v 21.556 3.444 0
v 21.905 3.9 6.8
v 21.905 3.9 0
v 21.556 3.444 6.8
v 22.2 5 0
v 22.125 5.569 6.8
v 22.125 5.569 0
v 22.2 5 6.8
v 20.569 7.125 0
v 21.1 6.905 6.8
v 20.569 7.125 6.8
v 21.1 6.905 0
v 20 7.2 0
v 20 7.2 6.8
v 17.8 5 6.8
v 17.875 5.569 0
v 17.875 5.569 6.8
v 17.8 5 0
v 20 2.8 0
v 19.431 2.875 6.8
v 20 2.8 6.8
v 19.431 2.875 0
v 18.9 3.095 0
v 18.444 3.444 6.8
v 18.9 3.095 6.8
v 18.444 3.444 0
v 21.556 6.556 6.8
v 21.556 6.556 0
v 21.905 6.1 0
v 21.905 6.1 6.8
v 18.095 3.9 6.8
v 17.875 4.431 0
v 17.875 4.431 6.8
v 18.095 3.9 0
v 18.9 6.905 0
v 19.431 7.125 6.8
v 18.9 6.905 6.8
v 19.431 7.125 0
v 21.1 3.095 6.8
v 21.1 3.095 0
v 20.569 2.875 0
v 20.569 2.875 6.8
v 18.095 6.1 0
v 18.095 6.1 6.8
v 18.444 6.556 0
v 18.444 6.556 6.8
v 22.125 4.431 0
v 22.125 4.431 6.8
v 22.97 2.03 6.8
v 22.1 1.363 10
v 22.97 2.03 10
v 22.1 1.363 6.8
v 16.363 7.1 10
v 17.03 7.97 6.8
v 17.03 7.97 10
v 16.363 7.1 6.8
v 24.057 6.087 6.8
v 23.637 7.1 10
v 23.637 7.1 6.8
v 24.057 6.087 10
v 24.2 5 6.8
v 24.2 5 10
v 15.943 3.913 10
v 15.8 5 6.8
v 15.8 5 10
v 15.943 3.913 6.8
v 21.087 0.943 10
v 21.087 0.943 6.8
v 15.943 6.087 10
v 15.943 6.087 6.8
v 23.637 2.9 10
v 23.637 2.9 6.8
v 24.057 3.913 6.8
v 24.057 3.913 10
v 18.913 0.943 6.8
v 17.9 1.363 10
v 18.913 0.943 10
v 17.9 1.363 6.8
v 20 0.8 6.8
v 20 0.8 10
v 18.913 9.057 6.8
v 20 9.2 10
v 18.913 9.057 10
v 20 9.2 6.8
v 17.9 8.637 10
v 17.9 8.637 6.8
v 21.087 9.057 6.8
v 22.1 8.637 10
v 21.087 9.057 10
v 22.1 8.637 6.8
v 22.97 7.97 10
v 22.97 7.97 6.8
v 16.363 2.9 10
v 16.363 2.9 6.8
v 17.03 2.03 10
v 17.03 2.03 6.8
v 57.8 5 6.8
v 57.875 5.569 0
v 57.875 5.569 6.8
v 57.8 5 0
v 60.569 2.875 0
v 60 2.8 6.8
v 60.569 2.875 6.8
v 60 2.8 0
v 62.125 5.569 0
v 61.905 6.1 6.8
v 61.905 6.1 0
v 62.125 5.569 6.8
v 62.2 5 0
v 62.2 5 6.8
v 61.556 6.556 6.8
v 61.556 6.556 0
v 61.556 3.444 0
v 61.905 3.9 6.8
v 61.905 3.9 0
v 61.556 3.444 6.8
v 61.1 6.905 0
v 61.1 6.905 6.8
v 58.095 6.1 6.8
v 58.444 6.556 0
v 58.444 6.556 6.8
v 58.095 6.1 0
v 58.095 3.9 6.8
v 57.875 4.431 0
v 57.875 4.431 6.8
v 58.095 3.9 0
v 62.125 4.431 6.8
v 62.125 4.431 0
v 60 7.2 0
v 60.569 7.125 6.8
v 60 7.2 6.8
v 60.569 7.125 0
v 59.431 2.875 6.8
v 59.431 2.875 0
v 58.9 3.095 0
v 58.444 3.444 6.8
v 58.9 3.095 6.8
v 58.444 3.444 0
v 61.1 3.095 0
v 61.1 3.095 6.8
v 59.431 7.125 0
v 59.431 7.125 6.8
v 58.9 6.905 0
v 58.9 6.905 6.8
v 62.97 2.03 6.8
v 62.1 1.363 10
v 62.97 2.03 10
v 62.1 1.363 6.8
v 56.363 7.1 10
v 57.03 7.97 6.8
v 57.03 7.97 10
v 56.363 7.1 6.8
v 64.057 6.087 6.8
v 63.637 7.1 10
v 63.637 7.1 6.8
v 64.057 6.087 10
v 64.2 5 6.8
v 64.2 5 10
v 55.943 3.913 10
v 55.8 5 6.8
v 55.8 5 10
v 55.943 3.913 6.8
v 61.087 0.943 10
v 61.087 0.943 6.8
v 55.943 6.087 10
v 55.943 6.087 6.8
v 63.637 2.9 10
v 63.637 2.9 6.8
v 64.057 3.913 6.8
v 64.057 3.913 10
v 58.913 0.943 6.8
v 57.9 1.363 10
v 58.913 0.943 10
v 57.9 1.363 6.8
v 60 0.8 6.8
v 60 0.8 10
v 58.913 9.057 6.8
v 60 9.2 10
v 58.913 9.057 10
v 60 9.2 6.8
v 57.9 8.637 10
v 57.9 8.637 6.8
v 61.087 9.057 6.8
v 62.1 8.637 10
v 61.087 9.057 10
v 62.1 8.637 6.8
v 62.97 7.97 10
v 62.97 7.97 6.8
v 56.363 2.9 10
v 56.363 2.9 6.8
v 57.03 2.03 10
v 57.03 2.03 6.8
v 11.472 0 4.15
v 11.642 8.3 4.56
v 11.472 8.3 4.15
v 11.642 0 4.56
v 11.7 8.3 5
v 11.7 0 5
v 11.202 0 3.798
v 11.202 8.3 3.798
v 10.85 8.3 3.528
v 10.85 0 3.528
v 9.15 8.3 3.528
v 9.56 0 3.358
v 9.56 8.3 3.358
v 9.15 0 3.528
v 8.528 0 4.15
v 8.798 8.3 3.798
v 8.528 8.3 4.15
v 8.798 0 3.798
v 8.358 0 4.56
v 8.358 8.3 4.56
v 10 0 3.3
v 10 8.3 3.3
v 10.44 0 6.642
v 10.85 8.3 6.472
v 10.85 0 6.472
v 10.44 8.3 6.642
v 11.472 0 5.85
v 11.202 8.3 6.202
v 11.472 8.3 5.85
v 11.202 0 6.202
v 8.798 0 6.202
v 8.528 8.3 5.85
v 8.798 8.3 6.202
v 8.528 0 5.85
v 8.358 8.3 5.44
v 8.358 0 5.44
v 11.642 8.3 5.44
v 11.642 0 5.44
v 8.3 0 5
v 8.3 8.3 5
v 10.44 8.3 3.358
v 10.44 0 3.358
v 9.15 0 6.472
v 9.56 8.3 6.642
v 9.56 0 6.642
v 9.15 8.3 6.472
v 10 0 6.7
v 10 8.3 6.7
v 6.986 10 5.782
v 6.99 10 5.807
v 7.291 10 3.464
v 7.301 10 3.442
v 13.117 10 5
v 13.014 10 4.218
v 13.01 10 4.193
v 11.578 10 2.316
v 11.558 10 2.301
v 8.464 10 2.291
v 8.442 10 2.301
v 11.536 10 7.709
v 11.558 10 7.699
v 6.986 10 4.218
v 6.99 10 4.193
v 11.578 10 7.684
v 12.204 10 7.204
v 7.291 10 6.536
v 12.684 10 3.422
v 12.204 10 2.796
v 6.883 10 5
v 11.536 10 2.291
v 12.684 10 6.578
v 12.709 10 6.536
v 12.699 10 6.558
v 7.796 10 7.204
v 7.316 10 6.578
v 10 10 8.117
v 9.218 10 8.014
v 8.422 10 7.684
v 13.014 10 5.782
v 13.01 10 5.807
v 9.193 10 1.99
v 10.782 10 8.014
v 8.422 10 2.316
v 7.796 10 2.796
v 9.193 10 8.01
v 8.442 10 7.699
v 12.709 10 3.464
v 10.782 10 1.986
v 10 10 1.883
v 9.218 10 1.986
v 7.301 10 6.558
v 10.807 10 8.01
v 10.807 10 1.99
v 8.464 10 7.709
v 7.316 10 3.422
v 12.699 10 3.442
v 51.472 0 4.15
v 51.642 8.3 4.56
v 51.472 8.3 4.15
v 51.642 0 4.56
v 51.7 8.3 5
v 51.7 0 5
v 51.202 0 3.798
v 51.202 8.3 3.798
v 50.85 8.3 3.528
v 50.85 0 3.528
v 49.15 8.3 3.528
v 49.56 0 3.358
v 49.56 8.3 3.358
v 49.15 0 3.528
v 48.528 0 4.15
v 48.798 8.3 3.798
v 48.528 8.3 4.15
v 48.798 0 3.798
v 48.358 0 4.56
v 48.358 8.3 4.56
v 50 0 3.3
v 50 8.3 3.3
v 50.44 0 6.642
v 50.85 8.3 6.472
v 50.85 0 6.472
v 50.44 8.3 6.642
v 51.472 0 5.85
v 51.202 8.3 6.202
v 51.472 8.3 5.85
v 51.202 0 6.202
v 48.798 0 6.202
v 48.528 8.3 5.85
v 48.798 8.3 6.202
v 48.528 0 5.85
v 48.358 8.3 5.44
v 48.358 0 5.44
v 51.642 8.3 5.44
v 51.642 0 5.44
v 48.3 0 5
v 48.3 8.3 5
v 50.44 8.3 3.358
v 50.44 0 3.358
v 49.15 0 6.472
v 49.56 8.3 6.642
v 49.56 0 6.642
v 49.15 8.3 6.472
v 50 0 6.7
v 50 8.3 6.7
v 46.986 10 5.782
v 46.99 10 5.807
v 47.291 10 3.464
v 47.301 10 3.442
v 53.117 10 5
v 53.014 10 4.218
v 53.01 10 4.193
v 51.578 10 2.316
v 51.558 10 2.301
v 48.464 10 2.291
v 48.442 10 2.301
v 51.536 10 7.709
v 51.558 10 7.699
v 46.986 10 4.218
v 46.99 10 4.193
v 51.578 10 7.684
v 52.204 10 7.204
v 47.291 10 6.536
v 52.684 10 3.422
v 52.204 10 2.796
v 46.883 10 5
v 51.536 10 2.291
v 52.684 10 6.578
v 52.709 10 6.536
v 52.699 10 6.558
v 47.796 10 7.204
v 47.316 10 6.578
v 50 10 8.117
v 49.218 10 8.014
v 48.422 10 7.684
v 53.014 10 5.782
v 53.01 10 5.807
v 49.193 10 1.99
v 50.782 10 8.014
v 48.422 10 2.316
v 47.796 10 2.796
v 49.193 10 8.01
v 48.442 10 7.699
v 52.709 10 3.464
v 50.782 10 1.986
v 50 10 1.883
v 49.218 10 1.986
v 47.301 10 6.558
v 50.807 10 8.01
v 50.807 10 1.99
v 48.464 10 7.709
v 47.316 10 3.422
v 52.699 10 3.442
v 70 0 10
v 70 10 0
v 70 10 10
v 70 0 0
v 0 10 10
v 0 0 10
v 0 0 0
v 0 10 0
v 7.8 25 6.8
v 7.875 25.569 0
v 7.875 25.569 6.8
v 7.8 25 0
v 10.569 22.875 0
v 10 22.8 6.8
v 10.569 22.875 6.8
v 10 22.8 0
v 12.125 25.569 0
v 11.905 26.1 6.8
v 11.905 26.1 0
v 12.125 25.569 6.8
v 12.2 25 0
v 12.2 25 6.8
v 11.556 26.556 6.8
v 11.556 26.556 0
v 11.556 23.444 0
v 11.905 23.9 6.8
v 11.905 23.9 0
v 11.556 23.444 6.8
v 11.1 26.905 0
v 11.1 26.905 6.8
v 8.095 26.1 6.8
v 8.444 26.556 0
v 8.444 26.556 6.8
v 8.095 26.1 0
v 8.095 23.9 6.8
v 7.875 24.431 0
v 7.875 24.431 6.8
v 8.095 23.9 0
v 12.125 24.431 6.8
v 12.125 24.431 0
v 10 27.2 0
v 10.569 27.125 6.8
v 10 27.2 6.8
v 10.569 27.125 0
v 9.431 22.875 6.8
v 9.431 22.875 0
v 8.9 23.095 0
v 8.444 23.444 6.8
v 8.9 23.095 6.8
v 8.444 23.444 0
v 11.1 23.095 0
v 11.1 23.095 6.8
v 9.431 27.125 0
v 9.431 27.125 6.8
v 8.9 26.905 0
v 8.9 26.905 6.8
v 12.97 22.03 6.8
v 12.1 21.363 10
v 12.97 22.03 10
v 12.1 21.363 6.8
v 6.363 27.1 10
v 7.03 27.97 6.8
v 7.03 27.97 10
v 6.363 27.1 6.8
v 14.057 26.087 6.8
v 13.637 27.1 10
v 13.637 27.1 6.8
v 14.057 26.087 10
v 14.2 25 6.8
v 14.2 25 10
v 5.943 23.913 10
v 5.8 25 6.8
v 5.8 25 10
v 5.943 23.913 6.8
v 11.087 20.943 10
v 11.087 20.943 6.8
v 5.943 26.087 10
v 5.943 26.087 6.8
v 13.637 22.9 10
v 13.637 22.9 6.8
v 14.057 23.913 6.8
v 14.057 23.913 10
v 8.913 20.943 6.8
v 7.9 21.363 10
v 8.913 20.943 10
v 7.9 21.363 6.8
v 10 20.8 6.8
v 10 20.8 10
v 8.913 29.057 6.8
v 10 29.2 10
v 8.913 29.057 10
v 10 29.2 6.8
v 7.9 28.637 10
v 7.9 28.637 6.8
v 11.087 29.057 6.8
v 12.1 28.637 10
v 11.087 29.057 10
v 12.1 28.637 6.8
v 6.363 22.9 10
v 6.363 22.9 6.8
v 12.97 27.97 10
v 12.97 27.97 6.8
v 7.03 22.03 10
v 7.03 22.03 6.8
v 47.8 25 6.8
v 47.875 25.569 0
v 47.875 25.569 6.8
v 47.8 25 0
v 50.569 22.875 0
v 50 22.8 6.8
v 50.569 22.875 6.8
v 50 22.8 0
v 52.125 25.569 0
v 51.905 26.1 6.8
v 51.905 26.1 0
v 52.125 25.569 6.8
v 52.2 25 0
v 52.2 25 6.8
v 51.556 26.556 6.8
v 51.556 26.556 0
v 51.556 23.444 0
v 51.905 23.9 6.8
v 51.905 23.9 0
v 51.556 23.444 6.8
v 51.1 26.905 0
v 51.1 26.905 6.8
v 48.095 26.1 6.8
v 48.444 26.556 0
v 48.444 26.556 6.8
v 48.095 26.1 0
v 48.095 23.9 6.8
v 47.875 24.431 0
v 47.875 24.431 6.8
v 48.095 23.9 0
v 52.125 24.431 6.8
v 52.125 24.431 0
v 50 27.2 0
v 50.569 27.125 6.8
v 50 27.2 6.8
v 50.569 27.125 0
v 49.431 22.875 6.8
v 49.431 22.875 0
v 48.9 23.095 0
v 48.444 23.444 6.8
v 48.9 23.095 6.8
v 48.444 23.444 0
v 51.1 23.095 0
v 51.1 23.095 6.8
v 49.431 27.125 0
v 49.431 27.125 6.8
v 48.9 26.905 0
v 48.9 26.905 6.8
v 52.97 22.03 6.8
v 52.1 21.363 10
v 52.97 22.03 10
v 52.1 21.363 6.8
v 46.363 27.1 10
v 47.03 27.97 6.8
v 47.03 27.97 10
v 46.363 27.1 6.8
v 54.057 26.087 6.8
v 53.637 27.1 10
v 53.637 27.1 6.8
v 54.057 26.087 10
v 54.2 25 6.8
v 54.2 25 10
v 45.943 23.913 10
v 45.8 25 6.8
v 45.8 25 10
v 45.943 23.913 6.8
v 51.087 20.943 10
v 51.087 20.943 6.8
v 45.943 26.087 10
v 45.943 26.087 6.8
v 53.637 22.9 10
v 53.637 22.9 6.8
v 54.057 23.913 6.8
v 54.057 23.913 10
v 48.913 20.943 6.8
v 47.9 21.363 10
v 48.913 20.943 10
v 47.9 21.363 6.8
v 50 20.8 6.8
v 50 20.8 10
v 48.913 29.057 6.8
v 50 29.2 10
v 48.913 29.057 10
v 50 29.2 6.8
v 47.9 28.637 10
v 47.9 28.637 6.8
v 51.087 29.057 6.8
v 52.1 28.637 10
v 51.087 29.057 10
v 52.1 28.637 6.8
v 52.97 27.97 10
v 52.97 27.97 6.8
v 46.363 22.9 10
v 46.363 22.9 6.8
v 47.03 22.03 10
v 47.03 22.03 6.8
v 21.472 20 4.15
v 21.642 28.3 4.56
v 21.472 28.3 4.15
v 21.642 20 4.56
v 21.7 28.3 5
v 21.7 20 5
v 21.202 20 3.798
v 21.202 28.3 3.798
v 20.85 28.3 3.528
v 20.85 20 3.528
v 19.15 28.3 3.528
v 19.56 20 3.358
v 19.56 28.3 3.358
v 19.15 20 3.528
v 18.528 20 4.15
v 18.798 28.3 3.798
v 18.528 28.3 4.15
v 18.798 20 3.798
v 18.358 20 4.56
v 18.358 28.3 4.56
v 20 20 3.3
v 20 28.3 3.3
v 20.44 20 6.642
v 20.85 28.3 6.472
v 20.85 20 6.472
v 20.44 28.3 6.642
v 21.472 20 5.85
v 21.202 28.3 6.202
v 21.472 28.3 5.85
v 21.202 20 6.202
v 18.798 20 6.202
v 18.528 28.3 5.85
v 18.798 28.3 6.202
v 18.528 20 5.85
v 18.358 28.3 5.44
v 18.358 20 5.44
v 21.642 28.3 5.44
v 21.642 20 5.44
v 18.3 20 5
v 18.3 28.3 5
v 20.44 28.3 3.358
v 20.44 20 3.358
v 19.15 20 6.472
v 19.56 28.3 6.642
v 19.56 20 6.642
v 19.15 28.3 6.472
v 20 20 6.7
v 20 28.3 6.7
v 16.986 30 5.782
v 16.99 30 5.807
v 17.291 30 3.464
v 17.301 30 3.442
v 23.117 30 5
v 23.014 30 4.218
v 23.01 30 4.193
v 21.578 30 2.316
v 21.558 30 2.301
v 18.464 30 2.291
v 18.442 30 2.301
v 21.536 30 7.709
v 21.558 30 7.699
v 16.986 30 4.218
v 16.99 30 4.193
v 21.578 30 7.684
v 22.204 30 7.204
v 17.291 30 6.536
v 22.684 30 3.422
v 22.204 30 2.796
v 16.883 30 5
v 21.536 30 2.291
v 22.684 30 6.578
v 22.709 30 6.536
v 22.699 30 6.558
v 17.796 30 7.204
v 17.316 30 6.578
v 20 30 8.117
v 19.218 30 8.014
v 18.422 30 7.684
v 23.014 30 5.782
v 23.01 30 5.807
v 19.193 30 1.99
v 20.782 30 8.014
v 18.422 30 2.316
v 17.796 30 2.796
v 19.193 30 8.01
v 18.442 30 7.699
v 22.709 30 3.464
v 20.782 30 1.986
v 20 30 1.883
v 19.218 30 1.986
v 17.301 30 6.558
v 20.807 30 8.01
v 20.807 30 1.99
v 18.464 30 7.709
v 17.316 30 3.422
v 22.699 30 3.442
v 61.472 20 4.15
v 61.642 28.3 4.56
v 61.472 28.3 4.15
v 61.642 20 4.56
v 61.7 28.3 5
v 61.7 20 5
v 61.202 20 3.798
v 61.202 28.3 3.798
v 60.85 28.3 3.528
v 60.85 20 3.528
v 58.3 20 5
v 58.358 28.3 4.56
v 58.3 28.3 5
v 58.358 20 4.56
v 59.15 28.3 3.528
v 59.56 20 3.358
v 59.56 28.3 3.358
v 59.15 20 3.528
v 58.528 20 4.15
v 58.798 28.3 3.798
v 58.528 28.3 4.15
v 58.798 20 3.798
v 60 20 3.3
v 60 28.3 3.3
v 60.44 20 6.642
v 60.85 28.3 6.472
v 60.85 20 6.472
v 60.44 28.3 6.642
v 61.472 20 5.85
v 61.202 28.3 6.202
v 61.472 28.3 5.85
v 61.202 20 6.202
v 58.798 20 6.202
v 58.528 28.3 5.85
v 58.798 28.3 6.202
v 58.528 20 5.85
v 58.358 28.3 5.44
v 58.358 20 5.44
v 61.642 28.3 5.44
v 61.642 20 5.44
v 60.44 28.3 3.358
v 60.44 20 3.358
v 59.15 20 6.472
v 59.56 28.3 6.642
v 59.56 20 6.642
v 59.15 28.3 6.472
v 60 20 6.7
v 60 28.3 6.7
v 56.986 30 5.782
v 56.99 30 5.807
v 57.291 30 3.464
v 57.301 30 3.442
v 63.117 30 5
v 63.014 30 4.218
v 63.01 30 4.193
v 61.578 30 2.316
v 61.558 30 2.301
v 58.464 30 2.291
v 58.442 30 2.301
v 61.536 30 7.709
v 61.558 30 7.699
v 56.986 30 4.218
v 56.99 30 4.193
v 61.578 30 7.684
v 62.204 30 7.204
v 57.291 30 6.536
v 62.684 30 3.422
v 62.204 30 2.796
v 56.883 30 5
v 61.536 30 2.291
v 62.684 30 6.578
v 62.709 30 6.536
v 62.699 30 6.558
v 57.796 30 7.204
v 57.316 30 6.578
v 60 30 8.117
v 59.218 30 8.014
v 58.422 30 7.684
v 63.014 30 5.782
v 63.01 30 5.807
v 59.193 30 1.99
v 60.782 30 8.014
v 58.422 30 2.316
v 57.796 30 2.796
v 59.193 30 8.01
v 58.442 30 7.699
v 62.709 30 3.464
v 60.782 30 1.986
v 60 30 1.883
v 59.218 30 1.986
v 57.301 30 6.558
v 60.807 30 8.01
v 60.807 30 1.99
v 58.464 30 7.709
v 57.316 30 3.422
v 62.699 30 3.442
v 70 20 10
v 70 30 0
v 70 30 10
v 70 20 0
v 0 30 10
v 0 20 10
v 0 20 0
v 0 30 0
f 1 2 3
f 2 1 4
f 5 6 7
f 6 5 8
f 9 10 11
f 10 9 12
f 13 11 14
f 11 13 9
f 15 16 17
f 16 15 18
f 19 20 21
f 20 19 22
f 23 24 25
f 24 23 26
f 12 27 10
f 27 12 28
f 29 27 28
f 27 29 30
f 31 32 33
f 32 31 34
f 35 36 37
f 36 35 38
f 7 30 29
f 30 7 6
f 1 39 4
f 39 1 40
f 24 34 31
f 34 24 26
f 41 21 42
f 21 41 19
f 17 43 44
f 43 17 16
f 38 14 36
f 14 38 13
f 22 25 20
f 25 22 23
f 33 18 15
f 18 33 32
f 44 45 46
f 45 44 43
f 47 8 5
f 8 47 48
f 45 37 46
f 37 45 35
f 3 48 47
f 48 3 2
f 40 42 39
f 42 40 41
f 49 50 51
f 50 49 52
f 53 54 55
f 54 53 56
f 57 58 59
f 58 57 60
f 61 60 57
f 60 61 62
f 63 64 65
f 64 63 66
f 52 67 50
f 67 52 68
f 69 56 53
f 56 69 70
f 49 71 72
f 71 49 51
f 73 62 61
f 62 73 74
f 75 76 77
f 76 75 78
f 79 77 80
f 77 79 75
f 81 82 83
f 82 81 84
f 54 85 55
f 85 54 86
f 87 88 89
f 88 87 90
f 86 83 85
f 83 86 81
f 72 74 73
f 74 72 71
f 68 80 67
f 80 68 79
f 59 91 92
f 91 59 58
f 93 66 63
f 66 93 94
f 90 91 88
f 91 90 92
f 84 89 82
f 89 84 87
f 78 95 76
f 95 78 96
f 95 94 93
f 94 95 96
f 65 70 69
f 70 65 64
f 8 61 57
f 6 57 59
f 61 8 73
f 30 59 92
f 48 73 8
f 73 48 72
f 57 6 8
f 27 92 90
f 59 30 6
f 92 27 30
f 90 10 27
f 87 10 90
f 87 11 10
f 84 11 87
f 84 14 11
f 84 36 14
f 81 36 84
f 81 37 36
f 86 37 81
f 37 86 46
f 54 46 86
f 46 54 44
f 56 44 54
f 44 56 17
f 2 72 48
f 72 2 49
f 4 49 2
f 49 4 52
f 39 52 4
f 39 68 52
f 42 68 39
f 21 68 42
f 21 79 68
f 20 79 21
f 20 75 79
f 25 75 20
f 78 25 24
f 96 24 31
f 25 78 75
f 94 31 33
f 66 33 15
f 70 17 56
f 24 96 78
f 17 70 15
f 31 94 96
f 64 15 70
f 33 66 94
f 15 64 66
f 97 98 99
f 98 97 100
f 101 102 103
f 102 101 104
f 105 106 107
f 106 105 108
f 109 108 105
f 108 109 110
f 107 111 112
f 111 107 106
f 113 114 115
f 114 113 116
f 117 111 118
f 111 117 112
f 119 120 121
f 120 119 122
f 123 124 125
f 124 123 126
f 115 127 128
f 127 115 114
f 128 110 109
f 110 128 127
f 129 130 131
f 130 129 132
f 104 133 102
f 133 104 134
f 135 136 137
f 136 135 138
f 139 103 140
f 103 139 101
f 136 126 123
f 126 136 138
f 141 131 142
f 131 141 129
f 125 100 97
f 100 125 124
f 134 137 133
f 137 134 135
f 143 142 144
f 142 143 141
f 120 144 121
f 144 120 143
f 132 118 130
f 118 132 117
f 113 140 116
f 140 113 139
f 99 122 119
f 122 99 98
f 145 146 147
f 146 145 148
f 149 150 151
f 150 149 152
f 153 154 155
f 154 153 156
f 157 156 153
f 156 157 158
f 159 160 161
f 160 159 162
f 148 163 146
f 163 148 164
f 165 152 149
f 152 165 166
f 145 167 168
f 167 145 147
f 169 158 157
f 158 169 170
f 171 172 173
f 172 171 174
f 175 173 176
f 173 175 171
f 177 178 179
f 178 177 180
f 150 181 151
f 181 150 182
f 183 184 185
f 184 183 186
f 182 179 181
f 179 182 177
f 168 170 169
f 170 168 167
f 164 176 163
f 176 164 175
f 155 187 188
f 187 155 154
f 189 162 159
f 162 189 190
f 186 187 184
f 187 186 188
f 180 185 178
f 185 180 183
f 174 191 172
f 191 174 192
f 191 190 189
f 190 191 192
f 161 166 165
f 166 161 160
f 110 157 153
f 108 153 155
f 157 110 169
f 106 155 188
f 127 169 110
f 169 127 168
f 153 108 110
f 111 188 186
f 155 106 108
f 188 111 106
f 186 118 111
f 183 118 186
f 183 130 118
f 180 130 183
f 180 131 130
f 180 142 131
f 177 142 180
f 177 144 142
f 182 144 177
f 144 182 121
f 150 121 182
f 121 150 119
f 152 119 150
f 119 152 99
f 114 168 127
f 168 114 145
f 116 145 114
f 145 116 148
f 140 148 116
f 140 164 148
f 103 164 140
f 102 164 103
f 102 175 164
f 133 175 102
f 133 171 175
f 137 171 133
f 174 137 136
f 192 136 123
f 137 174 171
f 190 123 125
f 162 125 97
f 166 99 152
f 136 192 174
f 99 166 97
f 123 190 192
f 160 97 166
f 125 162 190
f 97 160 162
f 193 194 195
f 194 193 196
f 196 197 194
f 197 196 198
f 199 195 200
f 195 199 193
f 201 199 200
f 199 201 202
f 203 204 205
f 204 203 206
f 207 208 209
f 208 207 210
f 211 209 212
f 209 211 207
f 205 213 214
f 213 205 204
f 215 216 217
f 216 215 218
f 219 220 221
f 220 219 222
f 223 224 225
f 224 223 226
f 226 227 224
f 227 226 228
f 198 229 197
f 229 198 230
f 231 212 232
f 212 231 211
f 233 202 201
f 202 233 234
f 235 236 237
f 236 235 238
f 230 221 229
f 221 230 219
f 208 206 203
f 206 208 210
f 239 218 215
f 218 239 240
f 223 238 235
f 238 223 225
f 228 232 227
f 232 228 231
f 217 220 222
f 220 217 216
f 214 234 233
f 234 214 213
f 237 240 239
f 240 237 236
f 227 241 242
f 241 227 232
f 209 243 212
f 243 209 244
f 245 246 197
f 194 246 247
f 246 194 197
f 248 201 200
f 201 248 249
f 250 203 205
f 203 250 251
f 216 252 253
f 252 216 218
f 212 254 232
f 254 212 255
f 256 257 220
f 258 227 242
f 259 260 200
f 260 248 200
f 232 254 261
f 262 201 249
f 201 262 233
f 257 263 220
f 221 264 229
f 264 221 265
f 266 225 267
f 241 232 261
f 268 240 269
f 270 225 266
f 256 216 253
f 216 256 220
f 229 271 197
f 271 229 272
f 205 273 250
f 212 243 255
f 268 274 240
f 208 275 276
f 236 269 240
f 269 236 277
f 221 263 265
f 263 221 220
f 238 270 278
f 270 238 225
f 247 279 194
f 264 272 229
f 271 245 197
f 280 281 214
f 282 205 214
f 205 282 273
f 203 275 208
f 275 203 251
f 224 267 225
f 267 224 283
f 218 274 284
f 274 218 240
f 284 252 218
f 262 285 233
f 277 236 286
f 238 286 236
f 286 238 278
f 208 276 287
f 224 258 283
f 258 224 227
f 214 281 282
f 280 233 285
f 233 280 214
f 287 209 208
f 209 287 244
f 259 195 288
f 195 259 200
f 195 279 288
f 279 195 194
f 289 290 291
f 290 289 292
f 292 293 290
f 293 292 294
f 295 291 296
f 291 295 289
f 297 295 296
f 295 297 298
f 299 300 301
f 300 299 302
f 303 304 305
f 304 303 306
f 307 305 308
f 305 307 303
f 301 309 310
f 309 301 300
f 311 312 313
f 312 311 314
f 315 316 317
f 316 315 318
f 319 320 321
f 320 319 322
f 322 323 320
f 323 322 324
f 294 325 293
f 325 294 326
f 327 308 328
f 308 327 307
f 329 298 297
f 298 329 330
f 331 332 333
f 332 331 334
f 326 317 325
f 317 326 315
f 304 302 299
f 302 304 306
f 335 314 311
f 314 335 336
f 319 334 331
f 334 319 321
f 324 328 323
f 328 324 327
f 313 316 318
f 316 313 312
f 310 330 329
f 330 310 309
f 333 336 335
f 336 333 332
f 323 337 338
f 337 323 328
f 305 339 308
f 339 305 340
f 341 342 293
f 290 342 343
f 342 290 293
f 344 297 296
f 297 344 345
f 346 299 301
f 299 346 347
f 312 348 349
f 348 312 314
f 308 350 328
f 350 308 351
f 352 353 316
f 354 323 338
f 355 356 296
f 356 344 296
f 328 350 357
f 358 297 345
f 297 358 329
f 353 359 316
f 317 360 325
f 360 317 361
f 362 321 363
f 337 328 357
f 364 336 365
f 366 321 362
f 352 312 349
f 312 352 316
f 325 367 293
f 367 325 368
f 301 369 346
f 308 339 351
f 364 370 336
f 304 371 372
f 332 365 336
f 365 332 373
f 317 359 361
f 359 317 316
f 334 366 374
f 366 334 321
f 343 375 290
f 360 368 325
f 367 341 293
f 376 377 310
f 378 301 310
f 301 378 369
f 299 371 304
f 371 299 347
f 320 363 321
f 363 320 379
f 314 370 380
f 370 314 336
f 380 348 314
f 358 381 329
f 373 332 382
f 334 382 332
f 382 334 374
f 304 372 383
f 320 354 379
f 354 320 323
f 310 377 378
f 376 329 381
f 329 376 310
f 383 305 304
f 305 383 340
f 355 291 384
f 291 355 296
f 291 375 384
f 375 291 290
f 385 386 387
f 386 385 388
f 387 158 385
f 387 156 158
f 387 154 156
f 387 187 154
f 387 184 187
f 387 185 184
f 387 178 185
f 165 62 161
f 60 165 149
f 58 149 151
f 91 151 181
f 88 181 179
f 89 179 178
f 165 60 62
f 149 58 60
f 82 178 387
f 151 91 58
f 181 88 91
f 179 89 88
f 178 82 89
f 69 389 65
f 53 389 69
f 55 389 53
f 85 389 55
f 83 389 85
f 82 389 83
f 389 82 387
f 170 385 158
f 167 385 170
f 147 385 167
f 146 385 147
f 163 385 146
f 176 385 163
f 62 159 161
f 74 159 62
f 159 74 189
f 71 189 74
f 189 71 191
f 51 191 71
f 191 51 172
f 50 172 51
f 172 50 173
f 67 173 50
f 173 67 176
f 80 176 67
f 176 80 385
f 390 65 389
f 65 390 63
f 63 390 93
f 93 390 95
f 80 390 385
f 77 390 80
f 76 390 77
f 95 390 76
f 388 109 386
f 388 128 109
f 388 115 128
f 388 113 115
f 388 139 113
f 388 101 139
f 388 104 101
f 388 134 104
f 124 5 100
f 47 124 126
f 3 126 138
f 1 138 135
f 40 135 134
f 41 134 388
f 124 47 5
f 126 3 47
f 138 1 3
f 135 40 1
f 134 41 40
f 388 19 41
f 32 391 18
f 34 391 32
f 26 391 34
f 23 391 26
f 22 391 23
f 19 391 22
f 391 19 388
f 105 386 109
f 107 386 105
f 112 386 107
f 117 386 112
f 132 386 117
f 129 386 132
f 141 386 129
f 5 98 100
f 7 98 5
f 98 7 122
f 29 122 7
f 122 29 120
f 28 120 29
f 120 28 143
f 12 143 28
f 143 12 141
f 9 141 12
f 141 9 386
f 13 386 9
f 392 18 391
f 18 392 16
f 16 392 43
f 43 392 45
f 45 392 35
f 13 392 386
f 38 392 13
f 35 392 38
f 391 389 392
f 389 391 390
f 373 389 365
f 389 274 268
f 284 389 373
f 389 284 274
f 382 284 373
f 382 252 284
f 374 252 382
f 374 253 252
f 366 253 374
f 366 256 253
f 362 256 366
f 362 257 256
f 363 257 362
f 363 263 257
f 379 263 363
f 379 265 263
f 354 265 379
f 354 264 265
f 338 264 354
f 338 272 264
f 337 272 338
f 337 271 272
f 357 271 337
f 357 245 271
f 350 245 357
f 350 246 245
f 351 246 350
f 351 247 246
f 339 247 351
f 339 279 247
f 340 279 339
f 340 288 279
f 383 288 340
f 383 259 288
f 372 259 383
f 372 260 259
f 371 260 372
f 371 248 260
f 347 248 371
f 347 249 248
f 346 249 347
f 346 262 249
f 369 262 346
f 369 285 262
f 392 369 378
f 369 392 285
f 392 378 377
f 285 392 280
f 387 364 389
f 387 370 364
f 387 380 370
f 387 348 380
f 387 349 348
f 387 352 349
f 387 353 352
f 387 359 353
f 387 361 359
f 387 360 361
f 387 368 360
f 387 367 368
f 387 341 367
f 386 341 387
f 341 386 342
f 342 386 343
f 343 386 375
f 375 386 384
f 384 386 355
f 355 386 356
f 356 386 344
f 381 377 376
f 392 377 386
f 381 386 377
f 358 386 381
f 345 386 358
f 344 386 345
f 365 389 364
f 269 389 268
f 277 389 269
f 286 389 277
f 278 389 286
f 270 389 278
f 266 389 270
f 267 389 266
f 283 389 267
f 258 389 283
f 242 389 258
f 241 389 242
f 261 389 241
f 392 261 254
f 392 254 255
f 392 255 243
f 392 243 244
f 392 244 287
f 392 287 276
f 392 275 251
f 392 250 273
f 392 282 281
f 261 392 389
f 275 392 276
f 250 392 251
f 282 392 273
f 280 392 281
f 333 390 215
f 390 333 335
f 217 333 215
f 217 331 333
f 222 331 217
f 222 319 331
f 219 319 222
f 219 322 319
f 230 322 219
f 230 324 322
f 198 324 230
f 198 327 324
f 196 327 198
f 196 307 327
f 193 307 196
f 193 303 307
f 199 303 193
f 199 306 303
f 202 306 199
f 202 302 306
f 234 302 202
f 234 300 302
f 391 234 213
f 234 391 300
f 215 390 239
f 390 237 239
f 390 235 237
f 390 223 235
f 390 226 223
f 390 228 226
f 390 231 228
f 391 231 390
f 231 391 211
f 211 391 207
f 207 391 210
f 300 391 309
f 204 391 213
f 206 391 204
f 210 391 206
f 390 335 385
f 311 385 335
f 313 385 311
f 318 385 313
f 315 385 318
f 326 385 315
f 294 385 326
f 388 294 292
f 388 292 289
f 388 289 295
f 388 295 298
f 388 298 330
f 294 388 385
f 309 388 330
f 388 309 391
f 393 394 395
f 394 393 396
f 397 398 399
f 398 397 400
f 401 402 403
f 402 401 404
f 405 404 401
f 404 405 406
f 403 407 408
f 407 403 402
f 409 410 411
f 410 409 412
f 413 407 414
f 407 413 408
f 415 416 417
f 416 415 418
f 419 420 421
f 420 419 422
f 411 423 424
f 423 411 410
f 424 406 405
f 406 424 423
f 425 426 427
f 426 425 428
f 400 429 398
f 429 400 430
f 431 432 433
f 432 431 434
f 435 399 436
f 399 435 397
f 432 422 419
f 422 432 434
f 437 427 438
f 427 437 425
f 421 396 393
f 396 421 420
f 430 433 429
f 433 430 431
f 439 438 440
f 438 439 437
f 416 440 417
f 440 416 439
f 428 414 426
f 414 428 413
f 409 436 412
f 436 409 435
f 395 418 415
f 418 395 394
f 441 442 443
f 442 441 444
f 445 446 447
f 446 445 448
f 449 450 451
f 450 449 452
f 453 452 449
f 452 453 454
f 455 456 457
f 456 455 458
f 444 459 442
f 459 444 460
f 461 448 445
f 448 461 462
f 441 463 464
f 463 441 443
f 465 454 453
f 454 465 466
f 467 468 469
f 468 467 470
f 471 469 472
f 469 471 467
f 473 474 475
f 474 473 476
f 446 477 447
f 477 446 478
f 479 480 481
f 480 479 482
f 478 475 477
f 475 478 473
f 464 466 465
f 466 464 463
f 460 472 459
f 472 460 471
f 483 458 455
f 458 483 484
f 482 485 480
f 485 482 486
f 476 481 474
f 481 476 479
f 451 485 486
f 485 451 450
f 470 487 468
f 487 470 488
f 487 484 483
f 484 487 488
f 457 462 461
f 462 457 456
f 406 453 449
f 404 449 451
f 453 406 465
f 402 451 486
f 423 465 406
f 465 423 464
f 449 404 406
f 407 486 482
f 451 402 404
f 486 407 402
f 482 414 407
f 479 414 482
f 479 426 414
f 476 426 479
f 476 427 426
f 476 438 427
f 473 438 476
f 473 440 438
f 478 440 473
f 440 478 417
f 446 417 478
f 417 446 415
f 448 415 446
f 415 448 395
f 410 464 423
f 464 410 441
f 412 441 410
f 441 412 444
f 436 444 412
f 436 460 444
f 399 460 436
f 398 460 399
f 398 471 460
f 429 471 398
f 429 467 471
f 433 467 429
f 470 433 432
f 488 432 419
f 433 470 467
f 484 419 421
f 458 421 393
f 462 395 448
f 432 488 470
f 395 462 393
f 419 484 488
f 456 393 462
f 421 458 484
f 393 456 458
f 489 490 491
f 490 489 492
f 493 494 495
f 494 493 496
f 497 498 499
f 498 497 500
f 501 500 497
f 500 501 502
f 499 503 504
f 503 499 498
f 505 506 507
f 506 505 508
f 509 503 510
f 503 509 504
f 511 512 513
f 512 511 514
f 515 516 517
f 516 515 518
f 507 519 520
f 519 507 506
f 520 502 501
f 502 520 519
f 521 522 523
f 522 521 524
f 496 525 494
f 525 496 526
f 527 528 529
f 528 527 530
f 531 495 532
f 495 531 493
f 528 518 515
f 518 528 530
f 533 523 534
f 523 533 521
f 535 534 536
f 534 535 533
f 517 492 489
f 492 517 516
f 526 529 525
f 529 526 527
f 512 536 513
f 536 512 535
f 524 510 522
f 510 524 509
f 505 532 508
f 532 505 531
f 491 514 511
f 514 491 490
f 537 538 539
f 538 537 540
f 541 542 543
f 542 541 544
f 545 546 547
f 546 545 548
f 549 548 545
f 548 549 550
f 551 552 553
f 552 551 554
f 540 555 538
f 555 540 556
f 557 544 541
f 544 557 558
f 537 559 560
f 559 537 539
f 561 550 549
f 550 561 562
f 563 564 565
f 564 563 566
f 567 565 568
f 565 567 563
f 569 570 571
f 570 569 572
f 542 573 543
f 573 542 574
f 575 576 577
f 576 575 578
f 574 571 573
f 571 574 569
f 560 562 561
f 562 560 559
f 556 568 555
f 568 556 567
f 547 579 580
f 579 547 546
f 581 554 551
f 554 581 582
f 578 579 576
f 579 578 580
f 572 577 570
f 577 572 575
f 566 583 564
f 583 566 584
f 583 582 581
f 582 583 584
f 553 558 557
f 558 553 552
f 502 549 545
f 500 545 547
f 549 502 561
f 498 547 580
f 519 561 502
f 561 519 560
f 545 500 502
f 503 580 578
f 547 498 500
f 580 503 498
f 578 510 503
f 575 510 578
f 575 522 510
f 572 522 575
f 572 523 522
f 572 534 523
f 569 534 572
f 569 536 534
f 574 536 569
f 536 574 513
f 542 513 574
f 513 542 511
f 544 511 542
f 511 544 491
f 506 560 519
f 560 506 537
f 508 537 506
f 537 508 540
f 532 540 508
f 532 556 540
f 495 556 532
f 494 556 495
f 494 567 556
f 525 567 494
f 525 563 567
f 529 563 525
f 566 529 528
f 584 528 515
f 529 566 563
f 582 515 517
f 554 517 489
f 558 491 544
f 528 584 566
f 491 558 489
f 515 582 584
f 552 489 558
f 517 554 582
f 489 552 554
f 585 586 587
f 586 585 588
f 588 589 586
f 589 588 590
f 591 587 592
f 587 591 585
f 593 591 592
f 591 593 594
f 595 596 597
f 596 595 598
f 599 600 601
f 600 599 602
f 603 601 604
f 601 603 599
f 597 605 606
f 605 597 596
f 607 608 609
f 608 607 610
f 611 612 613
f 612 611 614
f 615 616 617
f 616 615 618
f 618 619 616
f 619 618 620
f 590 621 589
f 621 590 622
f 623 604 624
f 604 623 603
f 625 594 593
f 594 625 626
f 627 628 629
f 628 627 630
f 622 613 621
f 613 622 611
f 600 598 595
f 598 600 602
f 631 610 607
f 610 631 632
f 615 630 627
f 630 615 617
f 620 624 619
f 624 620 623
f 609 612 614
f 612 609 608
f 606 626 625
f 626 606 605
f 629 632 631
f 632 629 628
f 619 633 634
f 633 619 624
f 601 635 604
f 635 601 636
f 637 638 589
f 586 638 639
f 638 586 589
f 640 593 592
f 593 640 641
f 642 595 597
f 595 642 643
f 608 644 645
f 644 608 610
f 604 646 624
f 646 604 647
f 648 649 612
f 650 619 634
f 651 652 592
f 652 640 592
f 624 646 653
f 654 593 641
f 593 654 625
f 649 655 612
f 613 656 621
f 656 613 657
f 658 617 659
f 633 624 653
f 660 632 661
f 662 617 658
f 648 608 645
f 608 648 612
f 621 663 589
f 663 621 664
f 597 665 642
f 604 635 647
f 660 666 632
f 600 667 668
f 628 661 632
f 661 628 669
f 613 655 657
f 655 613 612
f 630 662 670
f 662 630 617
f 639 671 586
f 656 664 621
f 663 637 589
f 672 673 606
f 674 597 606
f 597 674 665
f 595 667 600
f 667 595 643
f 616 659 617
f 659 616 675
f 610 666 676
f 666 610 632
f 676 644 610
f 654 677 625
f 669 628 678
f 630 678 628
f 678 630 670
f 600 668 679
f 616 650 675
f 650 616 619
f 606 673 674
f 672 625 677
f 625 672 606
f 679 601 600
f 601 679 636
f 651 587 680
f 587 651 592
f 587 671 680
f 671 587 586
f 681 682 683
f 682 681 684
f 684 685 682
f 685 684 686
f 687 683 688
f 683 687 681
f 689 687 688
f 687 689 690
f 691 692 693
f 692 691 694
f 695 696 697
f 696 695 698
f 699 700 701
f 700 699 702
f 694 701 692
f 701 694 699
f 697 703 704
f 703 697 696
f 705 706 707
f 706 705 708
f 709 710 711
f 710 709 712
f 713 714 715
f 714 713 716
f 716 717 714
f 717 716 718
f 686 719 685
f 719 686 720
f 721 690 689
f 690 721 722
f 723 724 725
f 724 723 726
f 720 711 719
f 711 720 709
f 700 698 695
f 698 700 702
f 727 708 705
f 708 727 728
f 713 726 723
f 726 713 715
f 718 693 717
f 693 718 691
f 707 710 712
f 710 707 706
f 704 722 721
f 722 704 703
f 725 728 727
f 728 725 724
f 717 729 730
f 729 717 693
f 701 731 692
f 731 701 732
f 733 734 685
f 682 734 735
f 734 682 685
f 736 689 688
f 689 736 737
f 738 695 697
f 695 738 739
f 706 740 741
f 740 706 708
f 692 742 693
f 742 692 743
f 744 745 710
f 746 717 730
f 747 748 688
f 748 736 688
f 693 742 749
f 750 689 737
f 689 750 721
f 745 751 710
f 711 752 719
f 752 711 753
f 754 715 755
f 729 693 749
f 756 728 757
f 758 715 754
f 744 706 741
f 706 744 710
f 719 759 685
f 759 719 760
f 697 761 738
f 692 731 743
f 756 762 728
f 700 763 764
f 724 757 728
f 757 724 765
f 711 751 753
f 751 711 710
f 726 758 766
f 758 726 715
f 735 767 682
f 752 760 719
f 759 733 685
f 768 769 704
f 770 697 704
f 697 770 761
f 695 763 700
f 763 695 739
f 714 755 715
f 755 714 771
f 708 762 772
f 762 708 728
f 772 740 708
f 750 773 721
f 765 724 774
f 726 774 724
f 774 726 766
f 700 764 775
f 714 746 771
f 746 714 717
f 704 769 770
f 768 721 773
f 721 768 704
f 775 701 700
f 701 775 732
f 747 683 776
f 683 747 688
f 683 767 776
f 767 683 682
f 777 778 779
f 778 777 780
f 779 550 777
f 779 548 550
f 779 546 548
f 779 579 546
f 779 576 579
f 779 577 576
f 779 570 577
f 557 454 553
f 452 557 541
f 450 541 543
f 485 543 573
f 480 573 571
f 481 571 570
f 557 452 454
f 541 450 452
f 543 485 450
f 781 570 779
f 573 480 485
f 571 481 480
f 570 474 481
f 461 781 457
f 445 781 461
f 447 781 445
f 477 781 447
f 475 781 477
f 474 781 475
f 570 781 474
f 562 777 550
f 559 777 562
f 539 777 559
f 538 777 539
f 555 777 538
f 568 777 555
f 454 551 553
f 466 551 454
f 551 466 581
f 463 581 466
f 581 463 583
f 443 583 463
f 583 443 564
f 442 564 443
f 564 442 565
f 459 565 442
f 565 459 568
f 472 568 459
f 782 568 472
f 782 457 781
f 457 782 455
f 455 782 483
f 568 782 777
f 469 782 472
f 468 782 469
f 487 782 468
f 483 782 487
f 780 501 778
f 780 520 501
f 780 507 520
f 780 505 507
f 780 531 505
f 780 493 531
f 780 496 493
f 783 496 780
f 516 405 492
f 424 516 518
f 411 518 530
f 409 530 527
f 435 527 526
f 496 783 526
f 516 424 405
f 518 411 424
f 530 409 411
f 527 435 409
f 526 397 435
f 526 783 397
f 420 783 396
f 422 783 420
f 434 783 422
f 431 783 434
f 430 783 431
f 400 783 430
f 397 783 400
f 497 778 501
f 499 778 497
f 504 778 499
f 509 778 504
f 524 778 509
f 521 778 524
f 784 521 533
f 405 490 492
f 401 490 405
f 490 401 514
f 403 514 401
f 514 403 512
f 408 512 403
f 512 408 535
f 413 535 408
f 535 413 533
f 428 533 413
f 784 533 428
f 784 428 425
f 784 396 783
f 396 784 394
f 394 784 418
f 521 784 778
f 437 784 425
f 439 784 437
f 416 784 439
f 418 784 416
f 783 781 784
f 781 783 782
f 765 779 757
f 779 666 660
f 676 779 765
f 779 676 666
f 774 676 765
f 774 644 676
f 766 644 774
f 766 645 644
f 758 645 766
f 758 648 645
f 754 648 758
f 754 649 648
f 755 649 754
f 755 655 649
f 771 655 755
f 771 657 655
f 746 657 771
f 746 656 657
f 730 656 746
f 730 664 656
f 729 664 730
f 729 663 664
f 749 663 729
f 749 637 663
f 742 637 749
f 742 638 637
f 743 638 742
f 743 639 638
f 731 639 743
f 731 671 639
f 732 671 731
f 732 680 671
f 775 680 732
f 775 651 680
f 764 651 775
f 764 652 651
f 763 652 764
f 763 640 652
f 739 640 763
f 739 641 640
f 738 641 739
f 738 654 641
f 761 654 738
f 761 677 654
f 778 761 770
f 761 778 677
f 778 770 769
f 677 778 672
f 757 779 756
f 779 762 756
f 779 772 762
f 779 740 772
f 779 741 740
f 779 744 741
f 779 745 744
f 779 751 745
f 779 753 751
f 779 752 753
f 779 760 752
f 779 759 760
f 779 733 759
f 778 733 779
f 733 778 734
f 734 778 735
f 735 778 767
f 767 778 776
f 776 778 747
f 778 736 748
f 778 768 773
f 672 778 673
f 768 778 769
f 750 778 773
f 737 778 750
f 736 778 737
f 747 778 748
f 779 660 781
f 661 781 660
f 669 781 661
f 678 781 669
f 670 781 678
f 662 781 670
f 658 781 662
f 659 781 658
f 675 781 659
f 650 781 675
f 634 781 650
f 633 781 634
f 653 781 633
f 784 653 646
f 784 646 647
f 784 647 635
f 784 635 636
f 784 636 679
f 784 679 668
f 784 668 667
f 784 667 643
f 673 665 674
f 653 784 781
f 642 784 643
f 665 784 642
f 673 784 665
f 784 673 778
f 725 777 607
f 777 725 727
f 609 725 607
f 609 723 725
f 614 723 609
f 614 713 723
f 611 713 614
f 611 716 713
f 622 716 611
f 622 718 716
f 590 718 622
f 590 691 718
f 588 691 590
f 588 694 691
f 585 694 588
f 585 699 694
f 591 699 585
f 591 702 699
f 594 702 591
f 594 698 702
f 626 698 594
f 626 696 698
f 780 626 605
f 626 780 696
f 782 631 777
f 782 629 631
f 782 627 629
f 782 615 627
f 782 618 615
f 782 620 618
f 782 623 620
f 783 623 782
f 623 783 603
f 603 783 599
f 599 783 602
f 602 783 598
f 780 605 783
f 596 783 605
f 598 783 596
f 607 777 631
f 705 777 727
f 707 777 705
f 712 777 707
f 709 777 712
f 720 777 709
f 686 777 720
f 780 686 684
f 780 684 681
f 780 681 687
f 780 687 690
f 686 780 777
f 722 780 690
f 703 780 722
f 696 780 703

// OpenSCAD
// Block to fix drawer in office

// Copyright (C) 2016 Embecosm Limited (www.embecosm.com)

// Contributor: Jeremy Bennett <jeremy.bennett@embecosm.com>

// This file is licensed under the Creative Commons Attribution-ShareAlike 3.0
// Unported License. To view a copy of this license, visit
// http://creativecommons.org/licenses/by-sa/3.0/ or send a letter to Creative
// Commons, PO Box 1866, Mountain View, CA 94042, USA.


// Size is 70 x 10 x10 mm, with holes at right angles

// - at 20mm and 60mm for M4 12mm pan head bolts
// - at 10mm and 50mm for 3.0 x 20mm wood screws

// and mirrored for the other side.

L = 70;
W = 10;
H = 10;

PAD = 0.2;
PAD2 = PAD * 2;
DELTA = 0.1;
DELTA2 = DELTA * 2;

BOLT_R = 4.0 / 2 + PAD;
BOLT_HEAD_R = 8.0 / 2 + PAD;
BOLT_HEAD_H = 3.0 + PAD;

SCREW_R = 3.0 / 2 + PAD;
SCREW_HEAD_R = 6.0 / 2 + PAD;
SCREW_HEAD_H = 1.5 + PAD;


module block () {
    cube (size = [L, W, H], center = false);
}

module bolt_hole (x_off) {
    translate (v = [x_off, H / 2, -DELTA])
        cylinder (r = BOLT_R, h = H + DELTA2, $fn = 24, center = false);
    translate (v = [x_off, H / 2, H - BOLT_HEAD_H])
        cylinder (r = BOLT_HEAD_R, h = BOLT_HEAD_H + DELTA, $fn = 24,
                  center = false);
}

module screw_hole (x_off) {
    translate (v = [x_off, -DELTA, W / 2])
        rotate (a = [-90, 0, 0])
            cylinder (r = SCREW_R, h = W + DELTA2, $fn = 24, center = false);
    translate (v = [x_off, W - SCREW_HEAD_H, W / 2])
        rotate (a = [-90, 0, 0])
            cylinder (r1 = SCREW_R, r2 = SCREW_HEAD_R,
                      h = SCREW_HEAD_H + DELTA, $fn = 24, center = false);
}

module fitting (bolt_off1, bolt_off2, screw_off1, screw_off2) {
    difference () {
        block ();
        bolt_hole (bolt_off1);
        bolt_hole (bolt_off2);
        screw_hole (screw_off1);
        screw_hole (screw_off2);
    }
}


module fitting_pair () {
    fitting (20, 60, 10, 50);                   // Left side
    translate (v = [0, 20, 0])
        fitting (10, 50, 20, 60);               // Right side
}

fitting_pair ();

// Local Variables:
// indent-tabs-mode: nil
// End:
